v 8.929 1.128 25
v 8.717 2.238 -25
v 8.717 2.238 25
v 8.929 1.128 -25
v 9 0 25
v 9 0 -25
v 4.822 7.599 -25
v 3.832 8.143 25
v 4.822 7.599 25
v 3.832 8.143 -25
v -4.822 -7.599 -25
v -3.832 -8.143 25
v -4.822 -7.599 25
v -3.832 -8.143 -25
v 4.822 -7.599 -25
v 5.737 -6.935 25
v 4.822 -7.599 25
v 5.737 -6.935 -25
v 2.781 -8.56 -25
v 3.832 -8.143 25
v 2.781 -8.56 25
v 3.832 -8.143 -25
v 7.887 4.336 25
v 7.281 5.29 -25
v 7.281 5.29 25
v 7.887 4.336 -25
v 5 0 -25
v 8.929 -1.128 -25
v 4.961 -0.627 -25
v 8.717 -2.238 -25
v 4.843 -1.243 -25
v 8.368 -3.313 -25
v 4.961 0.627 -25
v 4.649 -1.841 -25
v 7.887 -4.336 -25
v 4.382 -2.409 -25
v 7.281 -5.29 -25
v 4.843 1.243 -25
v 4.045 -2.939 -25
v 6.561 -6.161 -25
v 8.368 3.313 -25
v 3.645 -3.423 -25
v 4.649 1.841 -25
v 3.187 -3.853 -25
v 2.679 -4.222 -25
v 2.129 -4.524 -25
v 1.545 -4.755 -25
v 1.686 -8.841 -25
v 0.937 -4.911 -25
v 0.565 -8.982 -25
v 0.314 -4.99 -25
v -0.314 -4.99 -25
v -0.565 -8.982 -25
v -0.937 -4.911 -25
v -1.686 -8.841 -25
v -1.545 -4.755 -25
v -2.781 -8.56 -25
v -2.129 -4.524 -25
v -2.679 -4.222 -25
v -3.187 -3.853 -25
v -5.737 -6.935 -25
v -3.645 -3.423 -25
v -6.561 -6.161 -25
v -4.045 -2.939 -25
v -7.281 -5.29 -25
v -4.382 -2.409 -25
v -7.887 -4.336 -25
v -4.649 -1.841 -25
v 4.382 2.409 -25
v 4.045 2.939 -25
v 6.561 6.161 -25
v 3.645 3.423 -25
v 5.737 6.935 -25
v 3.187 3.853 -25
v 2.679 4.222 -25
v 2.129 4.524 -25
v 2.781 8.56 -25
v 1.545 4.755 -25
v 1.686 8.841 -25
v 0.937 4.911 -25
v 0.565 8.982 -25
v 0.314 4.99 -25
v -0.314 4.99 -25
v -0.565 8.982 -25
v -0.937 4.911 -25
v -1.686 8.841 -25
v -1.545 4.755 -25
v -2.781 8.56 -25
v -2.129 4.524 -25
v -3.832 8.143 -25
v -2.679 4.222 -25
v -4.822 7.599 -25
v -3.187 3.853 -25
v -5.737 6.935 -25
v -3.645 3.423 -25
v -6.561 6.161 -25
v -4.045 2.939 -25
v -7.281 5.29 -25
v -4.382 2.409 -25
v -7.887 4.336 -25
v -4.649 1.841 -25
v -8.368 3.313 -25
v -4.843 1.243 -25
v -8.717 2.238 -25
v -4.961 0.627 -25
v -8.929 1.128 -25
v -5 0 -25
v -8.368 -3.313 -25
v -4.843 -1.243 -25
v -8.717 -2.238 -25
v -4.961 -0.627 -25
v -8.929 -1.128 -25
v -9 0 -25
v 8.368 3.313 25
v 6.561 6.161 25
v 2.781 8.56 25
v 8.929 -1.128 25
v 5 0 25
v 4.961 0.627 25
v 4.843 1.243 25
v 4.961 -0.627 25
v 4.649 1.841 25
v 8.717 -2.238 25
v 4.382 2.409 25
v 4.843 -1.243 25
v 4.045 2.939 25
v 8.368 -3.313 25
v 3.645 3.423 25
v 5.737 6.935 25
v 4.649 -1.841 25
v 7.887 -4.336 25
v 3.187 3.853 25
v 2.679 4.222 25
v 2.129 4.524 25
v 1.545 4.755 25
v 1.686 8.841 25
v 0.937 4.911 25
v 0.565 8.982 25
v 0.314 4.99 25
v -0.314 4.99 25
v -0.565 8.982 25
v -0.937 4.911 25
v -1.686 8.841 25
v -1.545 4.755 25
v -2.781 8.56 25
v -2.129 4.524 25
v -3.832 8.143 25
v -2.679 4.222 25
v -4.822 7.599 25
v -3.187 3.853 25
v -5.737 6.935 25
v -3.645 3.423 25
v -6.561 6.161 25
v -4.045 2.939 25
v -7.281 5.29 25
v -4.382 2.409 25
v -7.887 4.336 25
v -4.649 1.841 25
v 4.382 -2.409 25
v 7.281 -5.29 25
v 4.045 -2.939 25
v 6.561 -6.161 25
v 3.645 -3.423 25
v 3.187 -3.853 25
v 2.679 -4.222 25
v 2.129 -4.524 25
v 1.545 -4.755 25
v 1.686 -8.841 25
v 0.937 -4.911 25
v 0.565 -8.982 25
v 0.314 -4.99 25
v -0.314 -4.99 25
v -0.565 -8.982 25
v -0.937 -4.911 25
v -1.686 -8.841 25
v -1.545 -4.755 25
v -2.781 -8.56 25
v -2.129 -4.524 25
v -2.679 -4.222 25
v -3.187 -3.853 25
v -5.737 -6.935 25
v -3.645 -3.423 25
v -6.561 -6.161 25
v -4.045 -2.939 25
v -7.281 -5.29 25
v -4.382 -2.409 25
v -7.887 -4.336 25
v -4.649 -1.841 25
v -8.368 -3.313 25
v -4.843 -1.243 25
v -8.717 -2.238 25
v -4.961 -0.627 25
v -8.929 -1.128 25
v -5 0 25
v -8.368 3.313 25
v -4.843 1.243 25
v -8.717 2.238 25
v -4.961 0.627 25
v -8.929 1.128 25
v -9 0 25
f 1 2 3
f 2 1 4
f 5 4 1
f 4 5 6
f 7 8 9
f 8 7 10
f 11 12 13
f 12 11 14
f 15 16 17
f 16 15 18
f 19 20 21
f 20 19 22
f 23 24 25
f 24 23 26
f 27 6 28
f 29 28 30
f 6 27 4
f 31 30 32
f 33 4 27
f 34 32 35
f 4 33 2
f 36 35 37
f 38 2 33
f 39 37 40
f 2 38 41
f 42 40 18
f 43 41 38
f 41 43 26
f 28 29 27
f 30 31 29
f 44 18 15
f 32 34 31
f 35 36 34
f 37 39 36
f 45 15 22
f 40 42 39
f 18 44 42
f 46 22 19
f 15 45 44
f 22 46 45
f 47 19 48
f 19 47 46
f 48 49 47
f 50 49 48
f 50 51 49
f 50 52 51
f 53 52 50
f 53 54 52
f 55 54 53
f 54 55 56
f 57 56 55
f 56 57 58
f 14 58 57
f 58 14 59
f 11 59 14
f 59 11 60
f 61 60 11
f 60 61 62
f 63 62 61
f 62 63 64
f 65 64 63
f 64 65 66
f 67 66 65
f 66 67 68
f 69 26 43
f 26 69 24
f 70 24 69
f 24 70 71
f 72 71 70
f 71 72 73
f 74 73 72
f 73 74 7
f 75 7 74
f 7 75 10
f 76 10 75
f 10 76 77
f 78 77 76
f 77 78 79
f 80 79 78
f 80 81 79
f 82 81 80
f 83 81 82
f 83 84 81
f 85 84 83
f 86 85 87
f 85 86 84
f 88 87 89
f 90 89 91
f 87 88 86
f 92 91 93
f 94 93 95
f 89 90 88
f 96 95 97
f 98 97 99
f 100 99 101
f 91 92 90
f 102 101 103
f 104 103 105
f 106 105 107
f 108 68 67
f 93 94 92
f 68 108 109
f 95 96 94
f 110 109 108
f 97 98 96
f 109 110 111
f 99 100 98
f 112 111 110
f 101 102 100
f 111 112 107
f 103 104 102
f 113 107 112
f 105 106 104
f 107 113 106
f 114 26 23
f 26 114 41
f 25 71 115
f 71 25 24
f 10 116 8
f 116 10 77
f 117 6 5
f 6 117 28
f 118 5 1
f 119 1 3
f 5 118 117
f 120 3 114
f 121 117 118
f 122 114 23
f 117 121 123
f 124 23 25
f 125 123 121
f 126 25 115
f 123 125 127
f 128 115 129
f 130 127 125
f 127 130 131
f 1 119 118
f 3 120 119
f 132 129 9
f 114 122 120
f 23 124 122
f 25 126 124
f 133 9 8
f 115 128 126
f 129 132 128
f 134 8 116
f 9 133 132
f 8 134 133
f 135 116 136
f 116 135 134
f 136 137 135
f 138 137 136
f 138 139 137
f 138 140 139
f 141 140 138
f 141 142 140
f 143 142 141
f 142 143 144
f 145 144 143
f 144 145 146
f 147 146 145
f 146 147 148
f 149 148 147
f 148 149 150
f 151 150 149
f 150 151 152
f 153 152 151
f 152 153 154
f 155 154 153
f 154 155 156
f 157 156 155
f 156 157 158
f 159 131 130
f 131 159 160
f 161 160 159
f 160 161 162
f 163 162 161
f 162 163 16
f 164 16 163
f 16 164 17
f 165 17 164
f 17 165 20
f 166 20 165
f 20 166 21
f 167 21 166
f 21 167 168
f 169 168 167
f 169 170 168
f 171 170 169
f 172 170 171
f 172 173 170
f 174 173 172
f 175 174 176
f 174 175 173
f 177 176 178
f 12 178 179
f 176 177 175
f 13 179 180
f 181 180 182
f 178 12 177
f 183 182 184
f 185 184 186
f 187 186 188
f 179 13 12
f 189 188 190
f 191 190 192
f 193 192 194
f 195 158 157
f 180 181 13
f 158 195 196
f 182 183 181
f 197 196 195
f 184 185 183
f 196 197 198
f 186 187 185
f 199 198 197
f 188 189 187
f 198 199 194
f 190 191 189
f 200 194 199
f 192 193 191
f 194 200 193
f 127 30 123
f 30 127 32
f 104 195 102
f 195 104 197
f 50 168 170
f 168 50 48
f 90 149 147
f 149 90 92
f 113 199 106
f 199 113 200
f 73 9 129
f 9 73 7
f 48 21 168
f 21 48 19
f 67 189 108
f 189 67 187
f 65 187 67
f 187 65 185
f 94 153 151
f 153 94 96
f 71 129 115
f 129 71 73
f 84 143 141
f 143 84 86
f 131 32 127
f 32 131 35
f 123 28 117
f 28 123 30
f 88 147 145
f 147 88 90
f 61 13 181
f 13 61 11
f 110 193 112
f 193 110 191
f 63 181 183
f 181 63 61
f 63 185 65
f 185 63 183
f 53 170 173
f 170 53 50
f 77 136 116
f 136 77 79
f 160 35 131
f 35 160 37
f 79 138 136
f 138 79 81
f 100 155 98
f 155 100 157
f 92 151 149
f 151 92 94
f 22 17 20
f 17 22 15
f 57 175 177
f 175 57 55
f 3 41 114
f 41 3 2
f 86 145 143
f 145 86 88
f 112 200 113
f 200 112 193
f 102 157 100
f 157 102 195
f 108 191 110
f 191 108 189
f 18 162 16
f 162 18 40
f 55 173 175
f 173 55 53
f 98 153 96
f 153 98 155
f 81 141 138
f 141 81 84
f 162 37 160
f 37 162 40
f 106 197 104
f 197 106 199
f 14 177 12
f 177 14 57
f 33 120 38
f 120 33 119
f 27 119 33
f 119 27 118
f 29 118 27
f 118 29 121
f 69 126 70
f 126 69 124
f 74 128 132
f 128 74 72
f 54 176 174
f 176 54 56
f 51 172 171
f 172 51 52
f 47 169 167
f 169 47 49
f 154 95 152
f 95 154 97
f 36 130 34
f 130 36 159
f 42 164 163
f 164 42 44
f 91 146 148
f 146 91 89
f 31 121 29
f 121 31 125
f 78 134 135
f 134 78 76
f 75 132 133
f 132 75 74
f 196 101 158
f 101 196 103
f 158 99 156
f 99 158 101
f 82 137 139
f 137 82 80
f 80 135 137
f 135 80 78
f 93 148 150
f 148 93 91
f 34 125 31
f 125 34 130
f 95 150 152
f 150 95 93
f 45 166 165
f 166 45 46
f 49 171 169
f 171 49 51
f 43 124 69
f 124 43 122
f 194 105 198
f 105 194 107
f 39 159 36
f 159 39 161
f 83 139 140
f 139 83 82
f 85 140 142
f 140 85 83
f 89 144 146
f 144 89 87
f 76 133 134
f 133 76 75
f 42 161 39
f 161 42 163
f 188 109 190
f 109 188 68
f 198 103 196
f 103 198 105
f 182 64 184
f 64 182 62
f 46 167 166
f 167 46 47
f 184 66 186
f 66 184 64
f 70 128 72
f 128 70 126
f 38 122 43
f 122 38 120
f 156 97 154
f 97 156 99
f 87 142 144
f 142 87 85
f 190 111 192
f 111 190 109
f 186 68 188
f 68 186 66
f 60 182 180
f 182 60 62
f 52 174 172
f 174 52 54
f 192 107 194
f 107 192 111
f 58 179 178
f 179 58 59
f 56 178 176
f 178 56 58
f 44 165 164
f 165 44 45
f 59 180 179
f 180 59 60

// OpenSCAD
$fn = 50;


difference() {
	union() {
		translate(v = [0, 0, -25.0000000000]) {
			cylinder(h = 50, r = 9.0000000000);
		}
	}
	union() {
		translate(v = [0, 0, -100.0000000000]) {
			cylinder(h = 200, r = 5.0000000000);
		}
	}
}
